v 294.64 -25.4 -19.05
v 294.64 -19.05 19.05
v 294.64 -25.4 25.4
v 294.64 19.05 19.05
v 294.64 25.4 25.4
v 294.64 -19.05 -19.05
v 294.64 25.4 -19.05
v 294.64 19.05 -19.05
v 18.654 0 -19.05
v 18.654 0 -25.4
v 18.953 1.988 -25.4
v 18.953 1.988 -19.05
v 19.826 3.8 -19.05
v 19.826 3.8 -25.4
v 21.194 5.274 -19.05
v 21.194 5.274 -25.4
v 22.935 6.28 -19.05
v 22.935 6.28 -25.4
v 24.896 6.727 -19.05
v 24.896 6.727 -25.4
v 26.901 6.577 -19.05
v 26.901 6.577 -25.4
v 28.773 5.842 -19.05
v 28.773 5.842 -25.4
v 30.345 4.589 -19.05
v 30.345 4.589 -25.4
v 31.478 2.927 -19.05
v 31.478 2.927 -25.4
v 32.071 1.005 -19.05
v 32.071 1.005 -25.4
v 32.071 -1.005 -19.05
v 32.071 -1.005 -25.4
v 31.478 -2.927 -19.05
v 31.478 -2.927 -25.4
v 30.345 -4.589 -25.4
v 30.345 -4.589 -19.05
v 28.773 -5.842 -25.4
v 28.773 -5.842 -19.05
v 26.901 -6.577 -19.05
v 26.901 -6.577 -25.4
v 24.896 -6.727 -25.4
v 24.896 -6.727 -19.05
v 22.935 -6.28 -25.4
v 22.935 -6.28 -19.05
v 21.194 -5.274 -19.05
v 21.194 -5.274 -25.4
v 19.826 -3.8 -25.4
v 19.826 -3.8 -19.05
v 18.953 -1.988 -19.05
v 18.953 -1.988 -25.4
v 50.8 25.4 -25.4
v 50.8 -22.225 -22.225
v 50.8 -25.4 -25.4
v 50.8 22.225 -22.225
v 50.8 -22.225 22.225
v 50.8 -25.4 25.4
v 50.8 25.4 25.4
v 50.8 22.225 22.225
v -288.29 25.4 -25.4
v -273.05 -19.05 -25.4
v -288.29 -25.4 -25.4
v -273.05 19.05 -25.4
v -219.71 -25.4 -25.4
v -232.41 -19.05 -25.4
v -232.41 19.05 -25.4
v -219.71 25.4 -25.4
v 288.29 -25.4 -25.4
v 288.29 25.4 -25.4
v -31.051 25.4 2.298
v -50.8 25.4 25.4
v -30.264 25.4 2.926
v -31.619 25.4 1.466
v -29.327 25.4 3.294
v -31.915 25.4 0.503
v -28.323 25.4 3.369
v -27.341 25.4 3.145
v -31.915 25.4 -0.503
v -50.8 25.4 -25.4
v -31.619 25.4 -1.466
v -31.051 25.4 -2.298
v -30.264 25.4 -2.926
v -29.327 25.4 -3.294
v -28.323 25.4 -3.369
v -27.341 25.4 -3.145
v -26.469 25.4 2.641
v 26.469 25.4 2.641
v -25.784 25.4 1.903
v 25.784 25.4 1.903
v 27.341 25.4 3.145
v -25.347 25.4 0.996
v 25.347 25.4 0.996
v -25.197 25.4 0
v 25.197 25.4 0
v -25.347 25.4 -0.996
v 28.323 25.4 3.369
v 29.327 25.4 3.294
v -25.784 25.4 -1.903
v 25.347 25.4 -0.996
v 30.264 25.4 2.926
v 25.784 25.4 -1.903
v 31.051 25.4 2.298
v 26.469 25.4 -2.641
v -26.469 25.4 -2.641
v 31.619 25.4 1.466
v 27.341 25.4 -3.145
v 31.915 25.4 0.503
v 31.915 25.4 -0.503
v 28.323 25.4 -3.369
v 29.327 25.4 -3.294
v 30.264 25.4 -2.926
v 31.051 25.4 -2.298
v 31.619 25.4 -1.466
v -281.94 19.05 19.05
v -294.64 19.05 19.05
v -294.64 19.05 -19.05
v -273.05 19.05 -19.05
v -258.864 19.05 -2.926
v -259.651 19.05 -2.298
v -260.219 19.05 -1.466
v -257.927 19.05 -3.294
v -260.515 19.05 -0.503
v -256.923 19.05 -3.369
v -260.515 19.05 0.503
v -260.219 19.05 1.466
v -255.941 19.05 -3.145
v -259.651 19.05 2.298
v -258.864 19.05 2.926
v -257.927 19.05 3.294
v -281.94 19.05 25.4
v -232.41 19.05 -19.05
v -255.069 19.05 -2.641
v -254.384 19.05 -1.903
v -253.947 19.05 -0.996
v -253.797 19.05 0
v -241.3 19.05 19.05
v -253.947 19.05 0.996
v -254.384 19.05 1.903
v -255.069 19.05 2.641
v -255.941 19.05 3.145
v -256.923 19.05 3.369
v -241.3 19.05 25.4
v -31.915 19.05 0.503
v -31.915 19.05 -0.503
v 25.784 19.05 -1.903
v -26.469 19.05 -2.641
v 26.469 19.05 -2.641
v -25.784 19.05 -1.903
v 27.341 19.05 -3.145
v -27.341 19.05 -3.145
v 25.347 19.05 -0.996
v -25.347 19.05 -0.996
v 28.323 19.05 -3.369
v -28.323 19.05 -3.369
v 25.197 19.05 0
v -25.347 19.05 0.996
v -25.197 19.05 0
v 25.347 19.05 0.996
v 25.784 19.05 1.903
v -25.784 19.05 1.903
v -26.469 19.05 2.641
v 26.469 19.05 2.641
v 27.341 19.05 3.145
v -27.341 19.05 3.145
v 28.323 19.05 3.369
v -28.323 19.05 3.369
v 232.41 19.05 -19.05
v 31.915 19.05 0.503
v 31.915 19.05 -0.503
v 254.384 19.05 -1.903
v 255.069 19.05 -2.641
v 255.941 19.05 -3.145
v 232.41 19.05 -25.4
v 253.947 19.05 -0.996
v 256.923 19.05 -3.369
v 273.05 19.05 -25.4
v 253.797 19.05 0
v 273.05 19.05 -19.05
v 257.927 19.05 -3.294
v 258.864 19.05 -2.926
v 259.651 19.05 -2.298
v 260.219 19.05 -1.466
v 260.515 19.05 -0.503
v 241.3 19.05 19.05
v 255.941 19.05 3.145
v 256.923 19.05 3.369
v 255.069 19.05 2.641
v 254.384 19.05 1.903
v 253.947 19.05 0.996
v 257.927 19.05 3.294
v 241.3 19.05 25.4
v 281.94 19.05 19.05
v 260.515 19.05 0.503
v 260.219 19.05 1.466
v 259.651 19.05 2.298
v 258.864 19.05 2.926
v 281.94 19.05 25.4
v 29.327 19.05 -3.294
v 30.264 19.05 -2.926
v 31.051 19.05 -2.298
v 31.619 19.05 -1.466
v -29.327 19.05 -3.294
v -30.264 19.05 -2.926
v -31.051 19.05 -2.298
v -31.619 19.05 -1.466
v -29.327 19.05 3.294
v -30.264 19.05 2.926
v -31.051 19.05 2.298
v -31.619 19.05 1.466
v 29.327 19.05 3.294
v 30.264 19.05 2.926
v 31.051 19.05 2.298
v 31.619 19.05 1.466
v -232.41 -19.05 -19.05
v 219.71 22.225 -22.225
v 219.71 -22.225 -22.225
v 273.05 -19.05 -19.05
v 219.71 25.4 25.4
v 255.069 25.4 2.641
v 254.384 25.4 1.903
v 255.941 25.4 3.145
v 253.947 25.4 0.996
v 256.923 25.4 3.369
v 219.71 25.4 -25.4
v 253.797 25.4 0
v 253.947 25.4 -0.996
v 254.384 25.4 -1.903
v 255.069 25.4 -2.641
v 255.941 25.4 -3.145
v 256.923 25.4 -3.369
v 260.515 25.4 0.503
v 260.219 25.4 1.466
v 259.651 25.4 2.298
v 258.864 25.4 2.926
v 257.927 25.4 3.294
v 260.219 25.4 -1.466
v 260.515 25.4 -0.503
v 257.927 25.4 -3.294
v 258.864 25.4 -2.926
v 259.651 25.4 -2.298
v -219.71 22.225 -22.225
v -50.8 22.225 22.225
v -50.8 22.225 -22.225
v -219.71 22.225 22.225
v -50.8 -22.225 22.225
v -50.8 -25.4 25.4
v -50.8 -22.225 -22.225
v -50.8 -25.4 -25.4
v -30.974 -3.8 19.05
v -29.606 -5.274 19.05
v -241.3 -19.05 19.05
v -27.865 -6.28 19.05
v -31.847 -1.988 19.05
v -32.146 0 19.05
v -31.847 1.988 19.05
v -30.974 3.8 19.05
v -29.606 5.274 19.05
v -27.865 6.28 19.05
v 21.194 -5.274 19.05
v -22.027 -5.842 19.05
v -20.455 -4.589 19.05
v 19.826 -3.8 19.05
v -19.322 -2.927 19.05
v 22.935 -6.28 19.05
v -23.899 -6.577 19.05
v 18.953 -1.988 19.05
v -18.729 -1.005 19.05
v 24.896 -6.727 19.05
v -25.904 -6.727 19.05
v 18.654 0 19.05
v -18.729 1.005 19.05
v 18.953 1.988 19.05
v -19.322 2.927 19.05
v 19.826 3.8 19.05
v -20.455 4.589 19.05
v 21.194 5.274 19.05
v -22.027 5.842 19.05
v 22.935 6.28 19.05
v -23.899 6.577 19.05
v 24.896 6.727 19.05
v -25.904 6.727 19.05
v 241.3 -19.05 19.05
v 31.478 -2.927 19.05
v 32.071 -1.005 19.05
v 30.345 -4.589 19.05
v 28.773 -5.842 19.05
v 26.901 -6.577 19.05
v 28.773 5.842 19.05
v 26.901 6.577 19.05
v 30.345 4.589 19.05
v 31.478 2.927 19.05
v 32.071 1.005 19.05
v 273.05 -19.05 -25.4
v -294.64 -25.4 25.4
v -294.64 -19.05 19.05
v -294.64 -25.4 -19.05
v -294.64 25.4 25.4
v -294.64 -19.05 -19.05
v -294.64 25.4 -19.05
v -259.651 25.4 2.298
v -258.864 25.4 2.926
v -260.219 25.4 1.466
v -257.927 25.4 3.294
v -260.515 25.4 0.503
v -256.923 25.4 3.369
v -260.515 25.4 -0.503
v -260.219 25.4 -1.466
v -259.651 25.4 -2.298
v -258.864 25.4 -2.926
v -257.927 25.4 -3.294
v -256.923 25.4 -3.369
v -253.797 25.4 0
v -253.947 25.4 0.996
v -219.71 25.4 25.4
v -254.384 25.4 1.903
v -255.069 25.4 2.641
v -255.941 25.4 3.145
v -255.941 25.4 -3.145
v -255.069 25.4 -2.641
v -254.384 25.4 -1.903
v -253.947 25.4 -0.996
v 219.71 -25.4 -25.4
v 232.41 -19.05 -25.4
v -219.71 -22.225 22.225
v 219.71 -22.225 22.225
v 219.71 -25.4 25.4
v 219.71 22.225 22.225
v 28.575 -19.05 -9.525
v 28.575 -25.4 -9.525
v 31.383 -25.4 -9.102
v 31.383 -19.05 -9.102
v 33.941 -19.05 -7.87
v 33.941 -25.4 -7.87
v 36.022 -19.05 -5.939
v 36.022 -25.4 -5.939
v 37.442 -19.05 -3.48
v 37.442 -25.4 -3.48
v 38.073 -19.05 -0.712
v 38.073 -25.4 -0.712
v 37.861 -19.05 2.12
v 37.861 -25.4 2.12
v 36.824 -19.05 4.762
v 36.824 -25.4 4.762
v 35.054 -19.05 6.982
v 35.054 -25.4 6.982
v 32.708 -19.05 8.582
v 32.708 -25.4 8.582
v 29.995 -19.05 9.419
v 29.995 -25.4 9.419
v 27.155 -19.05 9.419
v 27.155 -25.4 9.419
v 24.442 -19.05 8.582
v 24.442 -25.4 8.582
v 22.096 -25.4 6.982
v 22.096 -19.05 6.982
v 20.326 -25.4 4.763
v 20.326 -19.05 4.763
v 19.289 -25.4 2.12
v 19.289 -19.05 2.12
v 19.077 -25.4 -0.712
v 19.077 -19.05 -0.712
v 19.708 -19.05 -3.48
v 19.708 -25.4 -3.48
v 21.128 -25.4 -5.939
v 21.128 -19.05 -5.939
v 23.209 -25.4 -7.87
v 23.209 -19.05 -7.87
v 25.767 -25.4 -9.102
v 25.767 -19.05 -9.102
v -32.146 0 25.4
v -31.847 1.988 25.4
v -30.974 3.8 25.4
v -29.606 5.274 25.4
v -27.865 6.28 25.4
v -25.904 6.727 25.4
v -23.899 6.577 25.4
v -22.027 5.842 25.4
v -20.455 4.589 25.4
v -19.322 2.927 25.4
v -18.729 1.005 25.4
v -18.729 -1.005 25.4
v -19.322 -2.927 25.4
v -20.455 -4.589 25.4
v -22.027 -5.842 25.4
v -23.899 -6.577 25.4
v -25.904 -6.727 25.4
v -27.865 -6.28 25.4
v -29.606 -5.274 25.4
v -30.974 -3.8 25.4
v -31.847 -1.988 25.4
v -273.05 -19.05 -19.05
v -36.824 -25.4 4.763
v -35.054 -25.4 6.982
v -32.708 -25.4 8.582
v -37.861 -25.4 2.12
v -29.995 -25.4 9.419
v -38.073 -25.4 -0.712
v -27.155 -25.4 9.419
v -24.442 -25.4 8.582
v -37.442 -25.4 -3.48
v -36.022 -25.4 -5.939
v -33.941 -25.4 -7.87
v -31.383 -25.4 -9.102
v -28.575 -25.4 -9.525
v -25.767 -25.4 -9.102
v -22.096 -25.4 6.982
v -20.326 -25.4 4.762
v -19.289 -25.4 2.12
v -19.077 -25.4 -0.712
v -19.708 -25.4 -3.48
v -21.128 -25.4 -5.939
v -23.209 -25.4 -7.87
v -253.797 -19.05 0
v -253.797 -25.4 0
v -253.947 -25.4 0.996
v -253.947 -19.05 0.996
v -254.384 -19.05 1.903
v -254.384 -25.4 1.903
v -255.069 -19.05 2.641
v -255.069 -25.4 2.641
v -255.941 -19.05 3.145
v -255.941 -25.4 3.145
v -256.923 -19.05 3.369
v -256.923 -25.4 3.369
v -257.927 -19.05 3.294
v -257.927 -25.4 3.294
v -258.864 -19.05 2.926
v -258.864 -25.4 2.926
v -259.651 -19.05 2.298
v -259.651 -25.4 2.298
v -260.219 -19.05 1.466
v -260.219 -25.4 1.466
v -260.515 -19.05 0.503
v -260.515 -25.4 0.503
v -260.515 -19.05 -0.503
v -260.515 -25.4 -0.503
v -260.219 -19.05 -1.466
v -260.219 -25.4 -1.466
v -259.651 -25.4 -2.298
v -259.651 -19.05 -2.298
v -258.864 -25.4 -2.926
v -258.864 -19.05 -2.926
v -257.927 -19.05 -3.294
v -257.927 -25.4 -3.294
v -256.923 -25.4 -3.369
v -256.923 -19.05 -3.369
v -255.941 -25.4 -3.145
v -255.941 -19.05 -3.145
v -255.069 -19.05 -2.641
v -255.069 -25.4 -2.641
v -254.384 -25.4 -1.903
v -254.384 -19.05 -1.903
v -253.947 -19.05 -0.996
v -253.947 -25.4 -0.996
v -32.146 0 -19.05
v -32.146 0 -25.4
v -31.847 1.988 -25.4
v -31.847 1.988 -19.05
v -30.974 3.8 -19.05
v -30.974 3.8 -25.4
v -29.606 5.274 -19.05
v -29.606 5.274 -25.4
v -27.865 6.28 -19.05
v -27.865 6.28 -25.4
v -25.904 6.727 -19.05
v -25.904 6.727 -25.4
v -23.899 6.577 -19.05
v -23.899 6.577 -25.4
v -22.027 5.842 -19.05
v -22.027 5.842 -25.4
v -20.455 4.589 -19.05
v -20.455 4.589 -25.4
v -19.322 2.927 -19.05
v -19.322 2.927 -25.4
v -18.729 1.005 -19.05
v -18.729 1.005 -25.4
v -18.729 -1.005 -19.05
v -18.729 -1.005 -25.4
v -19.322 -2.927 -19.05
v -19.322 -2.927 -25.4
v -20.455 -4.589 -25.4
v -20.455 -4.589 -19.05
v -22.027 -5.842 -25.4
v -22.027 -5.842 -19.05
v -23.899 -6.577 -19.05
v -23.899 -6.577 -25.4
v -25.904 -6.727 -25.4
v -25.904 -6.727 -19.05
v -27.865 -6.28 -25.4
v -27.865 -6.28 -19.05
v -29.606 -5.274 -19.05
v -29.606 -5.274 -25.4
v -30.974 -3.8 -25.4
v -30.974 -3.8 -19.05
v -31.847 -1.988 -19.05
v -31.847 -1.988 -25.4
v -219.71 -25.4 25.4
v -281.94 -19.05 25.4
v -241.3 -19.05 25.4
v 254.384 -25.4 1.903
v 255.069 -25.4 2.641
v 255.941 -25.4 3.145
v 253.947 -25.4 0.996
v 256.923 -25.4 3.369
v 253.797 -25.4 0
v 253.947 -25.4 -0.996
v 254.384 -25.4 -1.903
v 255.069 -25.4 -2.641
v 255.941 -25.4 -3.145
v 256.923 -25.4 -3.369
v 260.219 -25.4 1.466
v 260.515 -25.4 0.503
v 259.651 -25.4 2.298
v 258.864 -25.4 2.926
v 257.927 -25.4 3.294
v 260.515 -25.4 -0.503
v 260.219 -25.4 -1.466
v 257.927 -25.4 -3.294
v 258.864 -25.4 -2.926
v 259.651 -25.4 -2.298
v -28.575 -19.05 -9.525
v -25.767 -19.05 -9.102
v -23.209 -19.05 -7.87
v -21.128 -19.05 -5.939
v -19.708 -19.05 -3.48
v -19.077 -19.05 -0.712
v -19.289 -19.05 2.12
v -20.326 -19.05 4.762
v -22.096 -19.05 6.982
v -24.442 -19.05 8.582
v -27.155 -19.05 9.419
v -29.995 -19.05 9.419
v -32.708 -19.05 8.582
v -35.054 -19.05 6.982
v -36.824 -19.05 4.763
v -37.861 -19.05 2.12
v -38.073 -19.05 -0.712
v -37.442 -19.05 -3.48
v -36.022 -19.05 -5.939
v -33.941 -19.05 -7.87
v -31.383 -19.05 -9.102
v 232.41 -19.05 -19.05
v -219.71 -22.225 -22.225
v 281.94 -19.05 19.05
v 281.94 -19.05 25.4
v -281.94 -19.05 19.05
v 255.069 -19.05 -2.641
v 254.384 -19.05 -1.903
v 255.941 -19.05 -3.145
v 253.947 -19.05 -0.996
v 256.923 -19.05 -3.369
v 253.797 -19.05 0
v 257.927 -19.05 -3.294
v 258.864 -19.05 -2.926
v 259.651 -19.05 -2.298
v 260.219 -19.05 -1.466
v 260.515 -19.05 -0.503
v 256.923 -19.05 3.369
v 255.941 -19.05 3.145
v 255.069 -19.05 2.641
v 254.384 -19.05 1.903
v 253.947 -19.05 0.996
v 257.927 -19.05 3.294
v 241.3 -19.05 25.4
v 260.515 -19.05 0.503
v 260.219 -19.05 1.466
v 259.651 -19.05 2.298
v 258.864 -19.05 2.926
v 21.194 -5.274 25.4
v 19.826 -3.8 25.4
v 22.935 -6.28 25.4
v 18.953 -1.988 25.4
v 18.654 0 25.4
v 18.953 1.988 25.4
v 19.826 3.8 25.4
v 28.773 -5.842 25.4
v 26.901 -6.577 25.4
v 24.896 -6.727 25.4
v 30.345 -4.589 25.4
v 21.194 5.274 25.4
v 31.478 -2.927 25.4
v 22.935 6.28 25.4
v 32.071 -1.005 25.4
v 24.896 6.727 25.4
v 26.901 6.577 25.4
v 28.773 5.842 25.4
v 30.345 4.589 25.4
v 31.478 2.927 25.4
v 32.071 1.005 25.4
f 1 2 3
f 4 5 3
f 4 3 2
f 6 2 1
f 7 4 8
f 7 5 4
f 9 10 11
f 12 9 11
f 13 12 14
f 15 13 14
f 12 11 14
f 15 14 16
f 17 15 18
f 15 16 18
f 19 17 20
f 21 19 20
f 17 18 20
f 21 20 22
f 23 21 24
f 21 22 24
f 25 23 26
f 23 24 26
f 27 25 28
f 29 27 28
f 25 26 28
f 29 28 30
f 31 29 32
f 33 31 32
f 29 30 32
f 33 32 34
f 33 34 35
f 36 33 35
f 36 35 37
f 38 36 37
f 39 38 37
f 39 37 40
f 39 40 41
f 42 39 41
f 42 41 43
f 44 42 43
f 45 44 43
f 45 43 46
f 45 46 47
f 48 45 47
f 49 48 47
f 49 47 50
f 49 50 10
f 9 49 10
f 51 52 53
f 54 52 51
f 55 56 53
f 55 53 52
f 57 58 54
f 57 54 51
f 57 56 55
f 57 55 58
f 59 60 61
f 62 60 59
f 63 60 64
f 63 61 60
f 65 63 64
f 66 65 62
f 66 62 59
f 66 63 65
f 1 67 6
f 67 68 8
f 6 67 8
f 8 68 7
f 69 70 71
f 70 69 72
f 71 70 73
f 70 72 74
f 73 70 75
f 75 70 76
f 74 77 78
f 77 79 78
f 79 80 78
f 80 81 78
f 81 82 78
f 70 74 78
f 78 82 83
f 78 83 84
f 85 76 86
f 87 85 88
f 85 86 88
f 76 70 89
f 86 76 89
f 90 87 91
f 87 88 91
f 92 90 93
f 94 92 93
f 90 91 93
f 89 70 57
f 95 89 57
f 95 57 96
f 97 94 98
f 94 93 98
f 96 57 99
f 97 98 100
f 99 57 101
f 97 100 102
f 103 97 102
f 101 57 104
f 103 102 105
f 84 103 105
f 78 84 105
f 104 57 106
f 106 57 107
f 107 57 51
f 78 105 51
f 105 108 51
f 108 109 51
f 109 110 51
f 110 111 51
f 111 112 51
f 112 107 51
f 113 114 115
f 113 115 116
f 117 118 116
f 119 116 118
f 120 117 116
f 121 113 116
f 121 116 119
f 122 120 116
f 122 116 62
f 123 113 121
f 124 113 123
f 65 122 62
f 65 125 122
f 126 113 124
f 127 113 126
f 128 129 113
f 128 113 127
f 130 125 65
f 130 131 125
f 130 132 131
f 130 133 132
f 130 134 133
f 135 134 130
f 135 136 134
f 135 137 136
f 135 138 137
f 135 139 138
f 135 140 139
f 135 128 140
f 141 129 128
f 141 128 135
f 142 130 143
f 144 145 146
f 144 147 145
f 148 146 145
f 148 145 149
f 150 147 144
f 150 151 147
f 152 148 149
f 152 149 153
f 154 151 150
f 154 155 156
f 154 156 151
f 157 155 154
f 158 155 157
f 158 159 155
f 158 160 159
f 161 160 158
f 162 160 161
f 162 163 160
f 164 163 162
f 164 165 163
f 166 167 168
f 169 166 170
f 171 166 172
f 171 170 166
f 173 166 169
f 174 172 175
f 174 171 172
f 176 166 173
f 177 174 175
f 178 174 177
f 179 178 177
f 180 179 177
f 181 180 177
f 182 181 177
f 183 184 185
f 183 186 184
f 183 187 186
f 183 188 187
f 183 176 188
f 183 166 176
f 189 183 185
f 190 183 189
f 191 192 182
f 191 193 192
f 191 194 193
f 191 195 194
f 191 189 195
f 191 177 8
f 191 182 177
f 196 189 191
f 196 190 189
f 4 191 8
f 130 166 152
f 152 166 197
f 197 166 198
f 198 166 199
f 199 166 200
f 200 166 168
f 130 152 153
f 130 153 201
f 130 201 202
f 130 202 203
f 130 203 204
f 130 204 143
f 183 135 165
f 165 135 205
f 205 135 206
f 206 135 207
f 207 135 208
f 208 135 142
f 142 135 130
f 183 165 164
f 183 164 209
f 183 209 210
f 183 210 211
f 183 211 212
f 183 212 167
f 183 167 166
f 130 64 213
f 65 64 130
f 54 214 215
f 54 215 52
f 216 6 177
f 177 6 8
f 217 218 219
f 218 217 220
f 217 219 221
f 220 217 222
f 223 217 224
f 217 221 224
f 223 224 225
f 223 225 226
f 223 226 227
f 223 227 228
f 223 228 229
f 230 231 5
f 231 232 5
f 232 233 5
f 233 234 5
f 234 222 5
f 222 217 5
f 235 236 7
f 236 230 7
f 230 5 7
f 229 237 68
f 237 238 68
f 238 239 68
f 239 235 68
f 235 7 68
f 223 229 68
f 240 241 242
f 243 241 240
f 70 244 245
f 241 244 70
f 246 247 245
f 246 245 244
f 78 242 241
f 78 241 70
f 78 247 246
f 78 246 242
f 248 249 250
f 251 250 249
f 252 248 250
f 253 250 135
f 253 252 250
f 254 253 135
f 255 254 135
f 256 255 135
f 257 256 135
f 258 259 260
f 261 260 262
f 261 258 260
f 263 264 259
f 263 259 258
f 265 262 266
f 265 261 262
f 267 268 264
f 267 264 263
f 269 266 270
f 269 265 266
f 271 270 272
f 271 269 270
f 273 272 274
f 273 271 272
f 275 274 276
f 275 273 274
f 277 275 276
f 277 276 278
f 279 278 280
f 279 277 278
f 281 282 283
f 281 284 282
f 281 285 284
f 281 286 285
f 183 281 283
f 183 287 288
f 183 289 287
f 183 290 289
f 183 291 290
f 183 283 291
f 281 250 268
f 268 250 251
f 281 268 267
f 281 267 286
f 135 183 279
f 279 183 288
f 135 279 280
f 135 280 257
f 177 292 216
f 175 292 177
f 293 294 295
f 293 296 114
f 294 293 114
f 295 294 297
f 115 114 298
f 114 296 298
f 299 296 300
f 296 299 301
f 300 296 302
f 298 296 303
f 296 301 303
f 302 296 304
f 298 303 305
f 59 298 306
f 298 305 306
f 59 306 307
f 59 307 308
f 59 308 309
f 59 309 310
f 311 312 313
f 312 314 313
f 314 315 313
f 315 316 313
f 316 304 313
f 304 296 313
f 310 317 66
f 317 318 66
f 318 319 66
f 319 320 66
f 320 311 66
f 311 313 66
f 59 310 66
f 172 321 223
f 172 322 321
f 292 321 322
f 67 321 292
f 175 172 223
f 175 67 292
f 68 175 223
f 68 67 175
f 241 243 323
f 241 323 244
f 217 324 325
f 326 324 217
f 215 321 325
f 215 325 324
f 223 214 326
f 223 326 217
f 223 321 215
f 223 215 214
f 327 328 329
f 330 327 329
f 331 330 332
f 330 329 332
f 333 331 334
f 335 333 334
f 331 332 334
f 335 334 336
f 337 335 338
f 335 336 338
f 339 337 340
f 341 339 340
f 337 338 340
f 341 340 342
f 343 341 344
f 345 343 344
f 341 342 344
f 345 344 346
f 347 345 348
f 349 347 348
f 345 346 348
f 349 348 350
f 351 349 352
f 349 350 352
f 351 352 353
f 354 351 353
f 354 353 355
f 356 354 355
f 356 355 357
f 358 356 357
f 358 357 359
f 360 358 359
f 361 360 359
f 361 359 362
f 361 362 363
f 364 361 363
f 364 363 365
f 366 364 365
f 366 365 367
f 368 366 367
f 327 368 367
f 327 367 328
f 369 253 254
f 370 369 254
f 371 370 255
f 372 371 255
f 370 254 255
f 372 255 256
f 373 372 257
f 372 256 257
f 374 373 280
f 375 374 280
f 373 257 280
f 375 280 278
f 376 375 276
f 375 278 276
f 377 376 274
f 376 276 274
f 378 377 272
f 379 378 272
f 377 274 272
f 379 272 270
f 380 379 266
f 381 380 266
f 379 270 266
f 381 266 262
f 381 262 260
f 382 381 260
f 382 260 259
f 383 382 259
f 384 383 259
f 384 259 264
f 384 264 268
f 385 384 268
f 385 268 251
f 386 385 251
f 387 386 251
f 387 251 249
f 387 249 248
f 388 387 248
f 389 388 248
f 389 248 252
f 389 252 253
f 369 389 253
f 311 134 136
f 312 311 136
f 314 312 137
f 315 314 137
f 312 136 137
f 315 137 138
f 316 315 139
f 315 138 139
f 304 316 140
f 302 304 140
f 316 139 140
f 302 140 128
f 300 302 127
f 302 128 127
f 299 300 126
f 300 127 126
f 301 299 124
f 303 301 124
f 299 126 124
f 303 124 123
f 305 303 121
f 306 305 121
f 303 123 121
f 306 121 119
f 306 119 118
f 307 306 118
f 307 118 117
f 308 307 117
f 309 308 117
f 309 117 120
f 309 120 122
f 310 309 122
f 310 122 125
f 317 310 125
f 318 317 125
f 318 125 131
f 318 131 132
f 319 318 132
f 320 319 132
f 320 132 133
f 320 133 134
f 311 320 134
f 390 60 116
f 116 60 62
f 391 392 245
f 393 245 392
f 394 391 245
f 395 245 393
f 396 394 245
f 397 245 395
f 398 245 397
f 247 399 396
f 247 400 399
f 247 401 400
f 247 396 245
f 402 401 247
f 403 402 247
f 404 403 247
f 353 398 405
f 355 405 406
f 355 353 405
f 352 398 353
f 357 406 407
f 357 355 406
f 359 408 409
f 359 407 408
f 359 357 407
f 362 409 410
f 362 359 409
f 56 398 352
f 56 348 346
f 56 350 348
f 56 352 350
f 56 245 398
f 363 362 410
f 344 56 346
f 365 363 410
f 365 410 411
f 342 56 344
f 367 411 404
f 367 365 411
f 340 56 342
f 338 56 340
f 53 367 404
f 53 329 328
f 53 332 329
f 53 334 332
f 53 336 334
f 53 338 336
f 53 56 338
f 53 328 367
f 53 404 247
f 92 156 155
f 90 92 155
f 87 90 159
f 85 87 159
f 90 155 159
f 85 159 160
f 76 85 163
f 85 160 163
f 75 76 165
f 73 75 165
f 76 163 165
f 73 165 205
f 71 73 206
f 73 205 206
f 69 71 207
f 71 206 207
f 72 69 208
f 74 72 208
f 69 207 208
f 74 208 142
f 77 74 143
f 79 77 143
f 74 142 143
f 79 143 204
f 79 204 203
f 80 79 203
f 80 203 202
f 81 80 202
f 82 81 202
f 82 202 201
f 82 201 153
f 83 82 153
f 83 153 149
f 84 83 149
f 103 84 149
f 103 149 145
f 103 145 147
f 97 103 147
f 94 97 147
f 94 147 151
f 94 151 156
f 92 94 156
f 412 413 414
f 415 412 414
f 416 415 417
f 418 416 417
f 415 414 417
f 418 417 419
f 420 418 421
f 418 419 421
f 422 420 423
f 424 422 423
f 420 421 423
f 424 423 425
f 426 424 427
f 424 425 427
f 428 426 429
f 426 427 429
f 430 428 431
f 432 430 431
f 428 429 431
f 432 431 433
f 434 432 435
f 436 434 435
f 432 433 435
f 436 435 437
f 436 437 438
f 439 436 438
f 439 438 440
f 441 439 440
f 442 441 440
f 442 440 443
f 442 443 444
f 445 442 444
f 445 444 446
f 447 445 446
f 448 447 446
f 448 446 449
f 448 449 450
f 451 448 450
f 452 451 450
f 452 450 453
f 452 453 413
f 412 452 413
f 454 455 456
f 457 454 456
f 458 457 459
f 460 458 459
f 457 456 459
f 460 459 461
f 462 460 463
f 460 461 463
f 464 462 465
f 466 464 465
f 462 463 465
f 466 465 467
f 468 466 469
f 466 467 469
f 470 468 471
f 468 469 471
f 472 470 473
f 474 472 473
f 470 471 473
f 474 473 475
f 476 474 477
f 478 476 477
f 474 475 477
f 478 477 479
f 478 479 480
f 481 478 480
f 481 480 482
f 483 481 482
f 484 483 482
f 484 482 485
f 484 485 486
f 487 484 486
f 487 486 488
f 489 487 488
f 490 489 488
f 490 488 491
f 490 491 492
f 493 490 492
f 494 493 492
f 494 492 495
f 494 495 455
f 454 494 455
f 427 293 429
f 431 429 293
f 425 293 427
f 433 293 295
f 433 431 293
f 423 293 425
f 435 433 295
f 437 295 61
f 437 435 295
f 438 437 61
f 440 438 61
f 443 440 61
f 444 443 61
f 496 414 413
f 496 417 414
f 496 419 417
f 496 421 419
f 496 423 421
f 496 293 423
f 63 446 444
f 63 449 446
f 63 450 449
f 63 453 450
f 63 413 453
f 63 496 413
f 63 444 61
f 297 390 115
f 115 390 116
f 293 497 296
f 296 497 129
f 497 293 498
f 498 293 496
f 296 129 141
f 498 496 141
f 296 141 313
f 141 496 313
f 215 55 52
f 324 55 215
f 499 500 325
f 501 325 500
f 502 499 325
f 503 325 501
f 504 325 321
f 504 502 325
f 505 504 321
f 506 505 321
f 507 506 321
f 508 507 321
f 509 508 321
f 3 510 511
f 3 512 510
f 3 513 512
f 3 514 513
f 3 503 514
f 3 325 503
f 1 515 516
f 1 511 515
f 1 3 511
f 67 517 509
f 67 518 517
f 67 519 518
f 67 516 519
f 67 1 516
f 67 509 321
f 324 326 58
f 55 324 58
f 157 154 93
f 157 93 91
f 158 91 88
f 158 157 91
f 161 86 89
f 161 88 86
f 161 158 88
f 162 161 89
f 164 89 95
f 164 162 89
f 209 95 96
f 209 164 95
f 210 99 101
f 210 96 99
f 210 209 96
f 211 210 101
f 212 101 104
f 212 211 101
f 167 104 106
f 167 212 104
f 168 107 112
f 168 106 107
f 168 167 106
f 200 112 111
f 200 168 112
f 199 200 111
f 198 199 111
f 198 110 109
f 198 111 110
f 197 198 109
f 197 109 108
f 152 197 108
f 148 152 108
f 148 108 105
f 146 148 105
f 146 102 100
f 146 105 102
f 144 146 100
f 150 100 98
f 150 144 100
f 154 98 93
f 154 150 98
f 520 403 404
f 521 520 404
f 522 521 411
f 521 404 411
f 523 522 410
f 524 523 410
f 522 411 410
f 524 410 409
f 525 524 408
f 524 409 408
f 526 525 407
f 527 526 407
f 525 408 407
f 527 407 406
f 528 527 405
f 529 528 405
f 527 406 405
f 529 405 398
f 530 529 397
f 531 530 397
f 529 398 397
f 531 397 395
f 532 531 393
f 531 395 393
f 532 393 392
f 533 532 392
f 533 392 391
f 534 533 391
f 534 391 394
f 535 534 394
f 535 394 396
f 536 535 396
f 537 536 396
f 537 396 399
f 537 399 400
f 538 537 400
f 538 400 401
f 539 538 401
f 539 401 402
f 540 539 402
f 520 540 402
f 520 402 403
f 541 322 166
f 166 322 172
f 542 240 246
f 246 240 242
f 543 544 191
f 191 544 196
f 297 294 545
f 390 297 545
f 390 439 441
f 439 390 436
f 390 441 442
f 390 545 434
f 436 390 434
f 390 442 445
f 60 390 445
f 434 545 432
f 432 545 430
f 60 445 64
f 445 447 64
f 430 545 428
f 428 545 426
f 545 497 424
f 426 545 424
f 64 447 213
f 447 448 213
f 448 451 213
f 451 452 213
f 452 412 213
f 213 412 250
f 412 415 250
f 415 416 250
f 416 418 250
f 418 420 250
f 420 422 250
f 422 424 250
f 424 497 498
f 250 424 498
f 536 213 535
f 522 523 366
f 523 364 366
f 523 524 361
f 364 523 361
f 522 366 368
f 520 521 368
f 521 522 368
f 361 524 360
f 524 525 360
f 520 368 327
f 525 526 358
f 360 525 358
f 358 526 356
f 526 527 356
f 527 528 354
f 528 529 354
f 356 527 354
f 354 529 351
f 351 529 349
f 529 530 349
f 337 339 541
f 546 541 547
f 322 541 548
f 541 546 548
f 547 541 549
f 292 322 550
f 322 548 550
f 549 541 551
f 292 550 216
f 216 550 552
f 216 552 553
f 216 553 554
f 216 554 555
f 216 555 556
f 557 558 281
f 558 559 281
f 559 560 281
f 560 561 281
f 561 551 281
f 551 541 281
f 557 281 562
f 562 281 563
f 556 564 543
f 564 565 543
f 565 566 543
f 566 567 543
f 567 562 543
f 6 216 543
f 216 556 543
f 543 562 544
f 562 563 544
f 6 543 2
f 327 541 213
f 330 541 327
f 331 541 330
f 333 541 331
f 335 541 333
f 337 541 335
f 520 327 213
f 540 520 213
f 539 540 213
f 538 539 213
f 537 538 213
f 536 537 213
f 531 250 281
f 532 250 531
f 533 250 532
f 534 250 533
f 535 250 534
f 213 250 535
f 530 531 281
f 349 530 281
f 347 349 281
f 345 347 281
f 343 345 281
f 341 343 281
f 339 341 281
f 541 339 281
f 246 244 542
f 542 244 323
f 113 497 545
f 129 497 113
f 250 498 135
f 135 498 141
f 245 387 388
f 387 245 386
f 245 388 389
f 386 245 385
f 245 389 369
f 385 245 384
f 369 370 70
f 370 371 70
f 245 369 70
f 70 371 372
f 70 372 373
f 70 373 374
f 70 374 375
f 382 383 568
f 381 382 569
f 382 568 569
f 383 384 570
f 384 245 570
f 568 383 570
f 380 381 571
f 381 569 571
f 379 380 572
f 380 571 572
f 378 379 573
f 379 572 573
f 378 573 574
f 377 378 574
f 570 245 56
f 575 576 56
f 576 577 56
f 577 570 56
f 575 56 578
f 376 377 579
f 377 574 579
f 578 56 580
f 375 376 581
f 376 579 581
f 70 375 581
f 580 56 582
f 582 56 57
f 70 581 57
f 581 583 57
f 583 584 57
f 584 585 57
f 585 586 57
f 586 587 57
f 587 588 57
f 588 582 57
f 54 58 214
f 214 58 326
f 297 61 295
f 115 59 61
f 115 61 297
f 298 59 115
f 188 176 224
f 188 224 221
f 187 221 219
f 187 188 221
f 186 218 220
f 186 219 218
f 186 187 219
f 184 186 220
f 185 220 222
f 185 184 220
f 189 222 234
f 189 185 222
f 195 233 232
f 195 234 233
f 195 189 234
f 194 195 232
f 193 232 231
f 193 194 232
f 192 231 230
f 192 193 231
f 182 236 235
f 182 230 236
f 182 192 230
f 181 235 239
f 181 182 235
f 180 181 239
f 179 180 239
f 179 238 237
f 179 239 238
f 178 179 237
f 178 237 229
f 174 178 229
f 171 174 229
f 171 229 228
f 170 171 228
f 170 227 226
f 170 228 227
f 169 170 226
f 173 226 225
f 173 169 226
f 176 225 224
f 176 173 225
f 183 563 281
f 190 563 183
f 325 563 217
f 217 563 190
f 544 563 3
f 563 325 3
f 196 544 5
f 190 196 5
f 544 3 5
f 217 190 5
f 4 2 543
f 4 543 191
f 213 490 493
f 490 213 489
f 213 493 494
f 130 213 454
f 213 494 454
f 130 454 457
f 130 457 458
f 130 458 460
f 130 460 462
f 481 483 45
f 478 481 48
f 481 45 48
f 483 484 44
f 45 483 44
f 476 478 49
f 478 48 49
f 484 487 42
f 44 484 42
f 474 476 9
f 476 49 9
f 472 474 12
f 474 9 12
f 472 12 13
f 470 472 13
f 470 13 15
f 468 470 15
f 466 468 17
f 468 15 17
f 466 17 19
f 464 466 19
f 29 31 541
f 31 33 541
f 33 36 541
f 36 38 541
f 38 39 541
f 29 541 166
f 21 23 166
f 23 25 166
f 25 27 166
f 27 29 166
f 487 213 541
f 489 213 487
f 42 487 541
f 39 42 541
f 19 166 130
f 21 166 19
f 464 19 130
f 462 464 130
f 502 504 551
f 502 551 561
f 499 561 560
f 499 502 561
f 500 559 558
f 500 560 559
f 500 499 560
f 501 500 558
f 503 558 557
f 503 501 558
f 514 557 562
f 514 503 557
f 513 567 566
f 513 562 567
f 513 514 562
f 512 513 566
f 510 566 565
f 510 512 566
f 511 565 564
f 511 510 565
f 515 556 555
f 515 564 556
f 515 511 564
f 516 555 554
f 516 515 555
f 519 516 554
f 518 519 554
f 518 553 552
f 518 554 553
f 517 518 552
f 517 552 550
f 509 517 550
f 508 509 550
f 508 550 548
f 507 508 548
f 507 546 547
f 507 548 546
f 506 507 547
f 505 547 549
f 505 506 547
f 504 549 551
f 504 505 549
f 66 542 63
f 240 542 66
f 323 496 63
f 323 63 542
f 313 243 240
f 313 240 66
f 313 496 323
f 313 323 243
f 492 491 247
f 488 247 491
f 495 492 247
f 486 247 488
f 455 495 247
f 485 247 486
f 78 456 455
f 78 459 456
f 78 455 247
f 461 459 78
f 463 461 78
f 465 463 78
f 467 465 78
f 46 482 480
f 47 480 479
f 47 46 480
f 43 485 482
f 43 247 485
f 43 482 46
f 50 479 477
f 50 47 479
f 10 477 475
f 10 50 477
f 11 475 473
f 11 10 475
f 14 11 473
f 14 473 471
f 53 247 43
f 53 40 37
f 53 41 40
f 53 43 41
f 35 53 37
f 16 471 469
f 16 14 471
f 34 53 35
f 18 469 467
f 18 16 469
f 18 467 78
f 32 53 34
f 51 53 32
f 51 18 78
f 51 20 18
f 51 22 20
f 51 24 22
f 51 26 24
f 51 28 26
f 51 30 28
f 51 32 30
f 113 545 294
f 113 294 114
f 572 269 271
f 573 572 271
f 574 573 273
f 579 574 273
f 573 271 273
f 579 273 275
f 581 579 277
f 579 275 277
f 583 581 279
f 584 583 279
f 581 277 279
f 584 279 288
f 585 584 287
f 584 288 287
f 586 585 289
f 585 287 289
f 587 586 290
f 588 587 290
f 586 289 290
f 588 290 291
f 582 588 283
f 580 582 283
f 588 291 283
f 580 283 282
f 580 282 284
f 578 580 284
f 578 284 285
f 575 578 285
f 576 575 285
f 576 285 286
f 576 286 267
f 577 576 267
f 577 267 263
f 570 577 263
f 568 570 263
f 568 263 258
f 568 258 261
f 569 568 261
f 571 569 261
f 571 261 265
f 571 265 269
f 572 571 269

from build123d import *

# Parameters (mm, degrees)
SKETCH1_W               = 50.8
SKETCH1_H               = 50.8
SKETCH1_W_2             = 38.1
SKETCH1_H_2             = 38.1
EXTRUDE1_DEPTH          = 355.6
F_1_2_CLEARANCE_HOLE1_D = 13.49248
EXTRUDE3_REACH          = 362.107
SKETCH6_W               = 40.64
SKETCH6_H               = 38.1
EXTRUDE4_REACH          = 362.107
SKETCH7_W               = 40.64
SKETCH7_H               = 38.1
SKETCH8_W               = 48.26
SKETCH8_H               = 50.8
EXTRUDE5_DEPTH          = 361.10715072
F_1_4_CLEARANCE_HOLE1_D = 6.7564
F_1_4_CLEARANCE_HOLE2_D = 6.7564
EXTRUDE6_DEPTH          = 361.10715072
EXTRUDE8_REACH          = 314.544
SKETCH17_R              = 9.525
SKETCH18_W              = 12.7
SKETCH18_H              = 50.8
EXTRUDE9_DEPTH          = 313.54387788
SKETCH19_W              = 168.91
SKETCH19_H              = 50.8
EXTRUDE10_DEPTH         = 3.175
SKETCH20_W              = 168.91
SKETCH20_H              = 44.45
EXTRUDE11_DEPTH         = 3.175
MIRROR5_COPY_1_SKETCH_W = 168.91
MIRROR5_COPY_1_SKETCH_H = 50.8
MIRROR5_COPY_1_DEPTH    = 3.175
MIRROR5_COPY_2_SKETCH_W = 168.91
MIRROR5_COPY_2_SKETCH_H = 44.45
MIRROR5_COPY_2_DEPTH    = 3.175


with BuildPart() as part:
    # Sketch1 → Extrude1 (new, symmetric)
    with BuildSketch(Plane(origin=(0, 0, 0), x_dir=(0, 0, -1), z_dir=(1, 0, 0))):
        Rectangle(SKETCH1_W, SKETCH1_H)
        Rectangle(SKETCH1_W_2, SKETCH1_H_2, mode=Mode.SUBTRACT)
    extrude(amount=EXTRUDE1_DEPTH, both=True)

    # 1/2 Clearance Hole1 (through all)
    with Locations(Plane.XY.offset(25.4)):
        with Locations((25.4, 0), (-25.4, 0)):
            Hole(F_1_2_CLEARANCE_HOLE1_D / 2)

    # Sketch6 → Extrude3 (cut, up to next)
    with BuildSketch(Plane.XY.offset(25.4), mode=Mode.PRIVATE) as extrude3_sk1:
        with Locations((-261.62, 0)):
            Rectangle(SKETCH6_W, SKETCH6_H)
    extrude3_tool1 = extrude(extrude3_sk1.sketch, amount=-EXTRUDE3_REACH, mode=Mode.PRIVATE) & part.part
    extrude3 = extrude3_tool1.solids().sort_by_distance((-261.62, 0, 25.4))[0]
    add(extrude3, mode=Mode.SUBTRACT)

    # Sketch7 → Extrude4 (cut, up to next)
    with BuildSketch(Plane(origin=(0, 0, -25.4), x_dir=(-1, 0, 0), z_dir=(0, 0, -1)), mode=Mode.PRIVATE) as extrude4_sk1:
        with Locations((252.73, 0)):
            Rectangle(SKETCH7_W, SKETCH7_H)
    extrude4_tool1 = extrude(extrude4_sk1.sketch, amount=-EXTRUDE4_REACH, mode=Mode.PRIVATE) & part.part
    extrude4 = extrude4_tool1.solids().sort_by_distance((-252.73, 0, -25.4))[0]
    add(extrude4, mode=Mode.SUBTRACT)

    # Sketch8 → Extrude5 (cut, through all)
    with BuildSketch(Plane.XY.offset(25.4)):
        with Locations((-331.47, 0)):
            Rectangle(SKETCH8_W, SKETCH8_H)
    extrude5 = extrude(amount=-EXTRUDE5_DEPTH, mode=Mode.SUBTRACT)

    # 1/4 Clearance Hole1 (through all)
    with Locations(Plane(origin=(0, 25.4, 0), x_dir=(-1, 0, 0), z_dir=(0, 1, 0))):
        with Locations((257.175, 0)):
            f_1_4_clearance_hole1 = Hole(F_1_4_CLEARANCE_HOLE1_D / 2)

    # 1/4 Clearance Hole2 (through all)
    with Locations(Plane(origin=(0, 25.4, 0), x_dir=(-1, 0, 0), z_dir=(0, 1, 0))):
        with Locations((28.575, 0)):
            f_1_4_clearance_hole2 = Hole(F_1_4_CLEARANCE_HOLE2_D / 2)

    # Sketch15 → Extrude6 (cut, through all)
    with BuildSketch(Plane(origin=(0, 25.4, 0), x_dir=(1, 0, 0), z_dir=(0, 1, 0))):
        Polygon((-307.34, 25.4), (-288.29, 25.4), (-307.34, 6.35), align=None)
    extrude6 = extrude(amount=-EXTRUDE6_DEPTH, mode=Mode.SUBTRACT)

    # Mirror1: Extrude3, Extrude4, Extrude5, 1/4 Clearance Hole1, 1/4 Clearance Hole2, Extrude6 across plane
    add(extrude3.mirror(Plane(origin=(0, 0, 0), x_dir=(0, 0, 1), z_dir=(1, 0, 0))), mode=Mode.SUBTRACT)
    add(extrude4.mirror(Plane(origin=(0, 0, 0), x_dir=(0, 0, 1), z_dir=(1, 0, 0))), mode=Mode.SUBTRACT)
    add(extrude5.mirror(Plane(origin=(0, 0, 0), x_dir=(0, 0, 1), z_dir=(1, 0, 0))), mode=Mode.SUBTRACT)
    add(f_1_4_clearance_hole1.mirror(Plane(origin=(0, 0, 0), x_dir=(0, 0, 1), z_dir=(1, 0, 0))), mode=Mode.SUBTRACT)
    add(f_1_4_clearance_hole2.mirror(Plane(origin=(0, 0, 0), x_dir=(0, 0, 1), z_dir=(1, 0, 0))), mode=Mode.SUBTRACT)
    add(extrude6.mirror(Plane(origin=(0, 0, 0), x_dir=(0, 0, 1), z_dir=(1, 0, 0))), mode=Mode.SUBTRACT)

    # Sketch17 → Extrude8 (cut, up to next)
    with BuildSketch(Plane.XZ.offset(25.4), mode=Mode.PRIVATE) as extrude8_sk1:
        with Locations(Location((-28.575, 0, 0), (0, 0, 270))):
            Circle(SKETCH17_R)
    extrude8_tool1 = extrude(extrude8_sk1.sketch, amount=-EXTRUDE8_REACH, mode=Mode.PRIVATE) & part.part
    # Sketch17 → Extrude8 (cut, up to next)
    with BuildSketch(Plane.XZ.offset(25.4), mode=Mode.PRIVATE) as extrude8_sk2:
        with Locations(Location((28.575, 0, 0), (0, 0, 270))):
            Circle(SKETCH17_R)
    extrude8_tool2 = extrude(extrude8_sk2.sketch, amount=-EXTRUDE8_REACH, mode=Mode.PRIVATE) & part.part
    add(extrude8_tool1.solids().sort_by_distance((-28.575, -25.4, 0))[0], mode=Mode.SUBTRACT)
    add(extrude8_tool2.solids().sort_by_distance((28.575, -25.4, 0))[0], mode=Mode.SUBTRACT)

    # Sketch18 → Extrude9 (cut, through all)
    with BuildSketch(Plane(origin=(0, 25.4, 0), x_dir=(1, 0, 0), z_dir=(0, 1, 0))):
        with Locations((-300.99, 0)):
            Rectangle(SKETCH18_W, SKETCH18_H)
    extrude9 = extrude(amount=-EXTRUDE9_DEPTH, mode=Mode.SUBTRACT)

    # Mirror2: Extrude9 across plane
    add(extrude9.mirror(Plane(origin=(0, 0, 0), x_dir=(0, 0, 1), z_dir=(1, 0, 0))), mode=Mode.SUBTRACT)

    # Sketch19 → Extrude10 (cut)
    with BuildSketch(Plane(origin=(0, 0, -25.4), x_dir=(-1, 0, 0), z_dir=(0, 0, -1))):
        with Locations((-135.255, 0)):
            Rectangle(SKETCH19_W, SKETCH19_H)
    extrude10 = extrude(amount=-EXTRUDE10_DEPTH, mode=Mode.SUBTRACT)

    # Mirror3: Extrude10 across plane
    add(extrude10.mirror(Plane.XY), mode=Mode.SUBTRACT)

    # Sketch20 → Extrude11 (cut)
    with BuildSketch(Plane.XZ.offset(25.4)):
        with Locations((135.255, 0)):
            Rectangle(SKETCH20_W, SKETCH20_H)
    extrude11 = extrude(amount=-EXTRUDE11_DEPTH, mode=Mode.SUBTRACT)

    # Mirror4: Extrude11 across plane
    add(extrude11.mirror(Plane.ZX), mode=Mode.SUBTRACT)

    # Mirror5: Extrude10, Extrude11 across plane
    add(extrude10.mirror(Plane(origin=(0, 0, 0), x_dir=(0, 0, 1), z_dir=(1, 0, 0))), mode=Mode.SUBTRACT)
    add(extrude11.mirror(Plane(origin=(0, 0, 0), x_dir=(0, 0, 1), z_dir=(1, 0, 0))), mode=Mode.SUBTRACT)

    # Mirror5 copy 1 sketch → Mirror5 copy 1 (cut)
    with BuildSketch(Plane.XY.offset(25.4)):
        with Locations((-135.255, 0)):
            Rectangle(MIRROR5_COPY_1_SKETCH_W, MIRROR5_COPY_1_SKETCH_H)
    extrude(amount=-MIRROR5_COPY_1_DEPTH, mode=Mode.SUBTRACT)

    # Mirror5 copy 2 sketch → Mirror5 copy 2 (cut)
    with BuildSketch(Plane(origin=(0, 25.4, 0), x_dir=(-1, 0, 0), z_dir=(0, 1, 0))):
        with Locations((135.255, 0)):
            Rectangle(MIRROR5_COPY_2_SKETCH_W, MIRROR5_COPY_2_SKETCH_H)
    extrude(amount=-MIRROR5_COPY_2_DEPTH, mode=Mode.SUBTRACT)


solid = part.part
